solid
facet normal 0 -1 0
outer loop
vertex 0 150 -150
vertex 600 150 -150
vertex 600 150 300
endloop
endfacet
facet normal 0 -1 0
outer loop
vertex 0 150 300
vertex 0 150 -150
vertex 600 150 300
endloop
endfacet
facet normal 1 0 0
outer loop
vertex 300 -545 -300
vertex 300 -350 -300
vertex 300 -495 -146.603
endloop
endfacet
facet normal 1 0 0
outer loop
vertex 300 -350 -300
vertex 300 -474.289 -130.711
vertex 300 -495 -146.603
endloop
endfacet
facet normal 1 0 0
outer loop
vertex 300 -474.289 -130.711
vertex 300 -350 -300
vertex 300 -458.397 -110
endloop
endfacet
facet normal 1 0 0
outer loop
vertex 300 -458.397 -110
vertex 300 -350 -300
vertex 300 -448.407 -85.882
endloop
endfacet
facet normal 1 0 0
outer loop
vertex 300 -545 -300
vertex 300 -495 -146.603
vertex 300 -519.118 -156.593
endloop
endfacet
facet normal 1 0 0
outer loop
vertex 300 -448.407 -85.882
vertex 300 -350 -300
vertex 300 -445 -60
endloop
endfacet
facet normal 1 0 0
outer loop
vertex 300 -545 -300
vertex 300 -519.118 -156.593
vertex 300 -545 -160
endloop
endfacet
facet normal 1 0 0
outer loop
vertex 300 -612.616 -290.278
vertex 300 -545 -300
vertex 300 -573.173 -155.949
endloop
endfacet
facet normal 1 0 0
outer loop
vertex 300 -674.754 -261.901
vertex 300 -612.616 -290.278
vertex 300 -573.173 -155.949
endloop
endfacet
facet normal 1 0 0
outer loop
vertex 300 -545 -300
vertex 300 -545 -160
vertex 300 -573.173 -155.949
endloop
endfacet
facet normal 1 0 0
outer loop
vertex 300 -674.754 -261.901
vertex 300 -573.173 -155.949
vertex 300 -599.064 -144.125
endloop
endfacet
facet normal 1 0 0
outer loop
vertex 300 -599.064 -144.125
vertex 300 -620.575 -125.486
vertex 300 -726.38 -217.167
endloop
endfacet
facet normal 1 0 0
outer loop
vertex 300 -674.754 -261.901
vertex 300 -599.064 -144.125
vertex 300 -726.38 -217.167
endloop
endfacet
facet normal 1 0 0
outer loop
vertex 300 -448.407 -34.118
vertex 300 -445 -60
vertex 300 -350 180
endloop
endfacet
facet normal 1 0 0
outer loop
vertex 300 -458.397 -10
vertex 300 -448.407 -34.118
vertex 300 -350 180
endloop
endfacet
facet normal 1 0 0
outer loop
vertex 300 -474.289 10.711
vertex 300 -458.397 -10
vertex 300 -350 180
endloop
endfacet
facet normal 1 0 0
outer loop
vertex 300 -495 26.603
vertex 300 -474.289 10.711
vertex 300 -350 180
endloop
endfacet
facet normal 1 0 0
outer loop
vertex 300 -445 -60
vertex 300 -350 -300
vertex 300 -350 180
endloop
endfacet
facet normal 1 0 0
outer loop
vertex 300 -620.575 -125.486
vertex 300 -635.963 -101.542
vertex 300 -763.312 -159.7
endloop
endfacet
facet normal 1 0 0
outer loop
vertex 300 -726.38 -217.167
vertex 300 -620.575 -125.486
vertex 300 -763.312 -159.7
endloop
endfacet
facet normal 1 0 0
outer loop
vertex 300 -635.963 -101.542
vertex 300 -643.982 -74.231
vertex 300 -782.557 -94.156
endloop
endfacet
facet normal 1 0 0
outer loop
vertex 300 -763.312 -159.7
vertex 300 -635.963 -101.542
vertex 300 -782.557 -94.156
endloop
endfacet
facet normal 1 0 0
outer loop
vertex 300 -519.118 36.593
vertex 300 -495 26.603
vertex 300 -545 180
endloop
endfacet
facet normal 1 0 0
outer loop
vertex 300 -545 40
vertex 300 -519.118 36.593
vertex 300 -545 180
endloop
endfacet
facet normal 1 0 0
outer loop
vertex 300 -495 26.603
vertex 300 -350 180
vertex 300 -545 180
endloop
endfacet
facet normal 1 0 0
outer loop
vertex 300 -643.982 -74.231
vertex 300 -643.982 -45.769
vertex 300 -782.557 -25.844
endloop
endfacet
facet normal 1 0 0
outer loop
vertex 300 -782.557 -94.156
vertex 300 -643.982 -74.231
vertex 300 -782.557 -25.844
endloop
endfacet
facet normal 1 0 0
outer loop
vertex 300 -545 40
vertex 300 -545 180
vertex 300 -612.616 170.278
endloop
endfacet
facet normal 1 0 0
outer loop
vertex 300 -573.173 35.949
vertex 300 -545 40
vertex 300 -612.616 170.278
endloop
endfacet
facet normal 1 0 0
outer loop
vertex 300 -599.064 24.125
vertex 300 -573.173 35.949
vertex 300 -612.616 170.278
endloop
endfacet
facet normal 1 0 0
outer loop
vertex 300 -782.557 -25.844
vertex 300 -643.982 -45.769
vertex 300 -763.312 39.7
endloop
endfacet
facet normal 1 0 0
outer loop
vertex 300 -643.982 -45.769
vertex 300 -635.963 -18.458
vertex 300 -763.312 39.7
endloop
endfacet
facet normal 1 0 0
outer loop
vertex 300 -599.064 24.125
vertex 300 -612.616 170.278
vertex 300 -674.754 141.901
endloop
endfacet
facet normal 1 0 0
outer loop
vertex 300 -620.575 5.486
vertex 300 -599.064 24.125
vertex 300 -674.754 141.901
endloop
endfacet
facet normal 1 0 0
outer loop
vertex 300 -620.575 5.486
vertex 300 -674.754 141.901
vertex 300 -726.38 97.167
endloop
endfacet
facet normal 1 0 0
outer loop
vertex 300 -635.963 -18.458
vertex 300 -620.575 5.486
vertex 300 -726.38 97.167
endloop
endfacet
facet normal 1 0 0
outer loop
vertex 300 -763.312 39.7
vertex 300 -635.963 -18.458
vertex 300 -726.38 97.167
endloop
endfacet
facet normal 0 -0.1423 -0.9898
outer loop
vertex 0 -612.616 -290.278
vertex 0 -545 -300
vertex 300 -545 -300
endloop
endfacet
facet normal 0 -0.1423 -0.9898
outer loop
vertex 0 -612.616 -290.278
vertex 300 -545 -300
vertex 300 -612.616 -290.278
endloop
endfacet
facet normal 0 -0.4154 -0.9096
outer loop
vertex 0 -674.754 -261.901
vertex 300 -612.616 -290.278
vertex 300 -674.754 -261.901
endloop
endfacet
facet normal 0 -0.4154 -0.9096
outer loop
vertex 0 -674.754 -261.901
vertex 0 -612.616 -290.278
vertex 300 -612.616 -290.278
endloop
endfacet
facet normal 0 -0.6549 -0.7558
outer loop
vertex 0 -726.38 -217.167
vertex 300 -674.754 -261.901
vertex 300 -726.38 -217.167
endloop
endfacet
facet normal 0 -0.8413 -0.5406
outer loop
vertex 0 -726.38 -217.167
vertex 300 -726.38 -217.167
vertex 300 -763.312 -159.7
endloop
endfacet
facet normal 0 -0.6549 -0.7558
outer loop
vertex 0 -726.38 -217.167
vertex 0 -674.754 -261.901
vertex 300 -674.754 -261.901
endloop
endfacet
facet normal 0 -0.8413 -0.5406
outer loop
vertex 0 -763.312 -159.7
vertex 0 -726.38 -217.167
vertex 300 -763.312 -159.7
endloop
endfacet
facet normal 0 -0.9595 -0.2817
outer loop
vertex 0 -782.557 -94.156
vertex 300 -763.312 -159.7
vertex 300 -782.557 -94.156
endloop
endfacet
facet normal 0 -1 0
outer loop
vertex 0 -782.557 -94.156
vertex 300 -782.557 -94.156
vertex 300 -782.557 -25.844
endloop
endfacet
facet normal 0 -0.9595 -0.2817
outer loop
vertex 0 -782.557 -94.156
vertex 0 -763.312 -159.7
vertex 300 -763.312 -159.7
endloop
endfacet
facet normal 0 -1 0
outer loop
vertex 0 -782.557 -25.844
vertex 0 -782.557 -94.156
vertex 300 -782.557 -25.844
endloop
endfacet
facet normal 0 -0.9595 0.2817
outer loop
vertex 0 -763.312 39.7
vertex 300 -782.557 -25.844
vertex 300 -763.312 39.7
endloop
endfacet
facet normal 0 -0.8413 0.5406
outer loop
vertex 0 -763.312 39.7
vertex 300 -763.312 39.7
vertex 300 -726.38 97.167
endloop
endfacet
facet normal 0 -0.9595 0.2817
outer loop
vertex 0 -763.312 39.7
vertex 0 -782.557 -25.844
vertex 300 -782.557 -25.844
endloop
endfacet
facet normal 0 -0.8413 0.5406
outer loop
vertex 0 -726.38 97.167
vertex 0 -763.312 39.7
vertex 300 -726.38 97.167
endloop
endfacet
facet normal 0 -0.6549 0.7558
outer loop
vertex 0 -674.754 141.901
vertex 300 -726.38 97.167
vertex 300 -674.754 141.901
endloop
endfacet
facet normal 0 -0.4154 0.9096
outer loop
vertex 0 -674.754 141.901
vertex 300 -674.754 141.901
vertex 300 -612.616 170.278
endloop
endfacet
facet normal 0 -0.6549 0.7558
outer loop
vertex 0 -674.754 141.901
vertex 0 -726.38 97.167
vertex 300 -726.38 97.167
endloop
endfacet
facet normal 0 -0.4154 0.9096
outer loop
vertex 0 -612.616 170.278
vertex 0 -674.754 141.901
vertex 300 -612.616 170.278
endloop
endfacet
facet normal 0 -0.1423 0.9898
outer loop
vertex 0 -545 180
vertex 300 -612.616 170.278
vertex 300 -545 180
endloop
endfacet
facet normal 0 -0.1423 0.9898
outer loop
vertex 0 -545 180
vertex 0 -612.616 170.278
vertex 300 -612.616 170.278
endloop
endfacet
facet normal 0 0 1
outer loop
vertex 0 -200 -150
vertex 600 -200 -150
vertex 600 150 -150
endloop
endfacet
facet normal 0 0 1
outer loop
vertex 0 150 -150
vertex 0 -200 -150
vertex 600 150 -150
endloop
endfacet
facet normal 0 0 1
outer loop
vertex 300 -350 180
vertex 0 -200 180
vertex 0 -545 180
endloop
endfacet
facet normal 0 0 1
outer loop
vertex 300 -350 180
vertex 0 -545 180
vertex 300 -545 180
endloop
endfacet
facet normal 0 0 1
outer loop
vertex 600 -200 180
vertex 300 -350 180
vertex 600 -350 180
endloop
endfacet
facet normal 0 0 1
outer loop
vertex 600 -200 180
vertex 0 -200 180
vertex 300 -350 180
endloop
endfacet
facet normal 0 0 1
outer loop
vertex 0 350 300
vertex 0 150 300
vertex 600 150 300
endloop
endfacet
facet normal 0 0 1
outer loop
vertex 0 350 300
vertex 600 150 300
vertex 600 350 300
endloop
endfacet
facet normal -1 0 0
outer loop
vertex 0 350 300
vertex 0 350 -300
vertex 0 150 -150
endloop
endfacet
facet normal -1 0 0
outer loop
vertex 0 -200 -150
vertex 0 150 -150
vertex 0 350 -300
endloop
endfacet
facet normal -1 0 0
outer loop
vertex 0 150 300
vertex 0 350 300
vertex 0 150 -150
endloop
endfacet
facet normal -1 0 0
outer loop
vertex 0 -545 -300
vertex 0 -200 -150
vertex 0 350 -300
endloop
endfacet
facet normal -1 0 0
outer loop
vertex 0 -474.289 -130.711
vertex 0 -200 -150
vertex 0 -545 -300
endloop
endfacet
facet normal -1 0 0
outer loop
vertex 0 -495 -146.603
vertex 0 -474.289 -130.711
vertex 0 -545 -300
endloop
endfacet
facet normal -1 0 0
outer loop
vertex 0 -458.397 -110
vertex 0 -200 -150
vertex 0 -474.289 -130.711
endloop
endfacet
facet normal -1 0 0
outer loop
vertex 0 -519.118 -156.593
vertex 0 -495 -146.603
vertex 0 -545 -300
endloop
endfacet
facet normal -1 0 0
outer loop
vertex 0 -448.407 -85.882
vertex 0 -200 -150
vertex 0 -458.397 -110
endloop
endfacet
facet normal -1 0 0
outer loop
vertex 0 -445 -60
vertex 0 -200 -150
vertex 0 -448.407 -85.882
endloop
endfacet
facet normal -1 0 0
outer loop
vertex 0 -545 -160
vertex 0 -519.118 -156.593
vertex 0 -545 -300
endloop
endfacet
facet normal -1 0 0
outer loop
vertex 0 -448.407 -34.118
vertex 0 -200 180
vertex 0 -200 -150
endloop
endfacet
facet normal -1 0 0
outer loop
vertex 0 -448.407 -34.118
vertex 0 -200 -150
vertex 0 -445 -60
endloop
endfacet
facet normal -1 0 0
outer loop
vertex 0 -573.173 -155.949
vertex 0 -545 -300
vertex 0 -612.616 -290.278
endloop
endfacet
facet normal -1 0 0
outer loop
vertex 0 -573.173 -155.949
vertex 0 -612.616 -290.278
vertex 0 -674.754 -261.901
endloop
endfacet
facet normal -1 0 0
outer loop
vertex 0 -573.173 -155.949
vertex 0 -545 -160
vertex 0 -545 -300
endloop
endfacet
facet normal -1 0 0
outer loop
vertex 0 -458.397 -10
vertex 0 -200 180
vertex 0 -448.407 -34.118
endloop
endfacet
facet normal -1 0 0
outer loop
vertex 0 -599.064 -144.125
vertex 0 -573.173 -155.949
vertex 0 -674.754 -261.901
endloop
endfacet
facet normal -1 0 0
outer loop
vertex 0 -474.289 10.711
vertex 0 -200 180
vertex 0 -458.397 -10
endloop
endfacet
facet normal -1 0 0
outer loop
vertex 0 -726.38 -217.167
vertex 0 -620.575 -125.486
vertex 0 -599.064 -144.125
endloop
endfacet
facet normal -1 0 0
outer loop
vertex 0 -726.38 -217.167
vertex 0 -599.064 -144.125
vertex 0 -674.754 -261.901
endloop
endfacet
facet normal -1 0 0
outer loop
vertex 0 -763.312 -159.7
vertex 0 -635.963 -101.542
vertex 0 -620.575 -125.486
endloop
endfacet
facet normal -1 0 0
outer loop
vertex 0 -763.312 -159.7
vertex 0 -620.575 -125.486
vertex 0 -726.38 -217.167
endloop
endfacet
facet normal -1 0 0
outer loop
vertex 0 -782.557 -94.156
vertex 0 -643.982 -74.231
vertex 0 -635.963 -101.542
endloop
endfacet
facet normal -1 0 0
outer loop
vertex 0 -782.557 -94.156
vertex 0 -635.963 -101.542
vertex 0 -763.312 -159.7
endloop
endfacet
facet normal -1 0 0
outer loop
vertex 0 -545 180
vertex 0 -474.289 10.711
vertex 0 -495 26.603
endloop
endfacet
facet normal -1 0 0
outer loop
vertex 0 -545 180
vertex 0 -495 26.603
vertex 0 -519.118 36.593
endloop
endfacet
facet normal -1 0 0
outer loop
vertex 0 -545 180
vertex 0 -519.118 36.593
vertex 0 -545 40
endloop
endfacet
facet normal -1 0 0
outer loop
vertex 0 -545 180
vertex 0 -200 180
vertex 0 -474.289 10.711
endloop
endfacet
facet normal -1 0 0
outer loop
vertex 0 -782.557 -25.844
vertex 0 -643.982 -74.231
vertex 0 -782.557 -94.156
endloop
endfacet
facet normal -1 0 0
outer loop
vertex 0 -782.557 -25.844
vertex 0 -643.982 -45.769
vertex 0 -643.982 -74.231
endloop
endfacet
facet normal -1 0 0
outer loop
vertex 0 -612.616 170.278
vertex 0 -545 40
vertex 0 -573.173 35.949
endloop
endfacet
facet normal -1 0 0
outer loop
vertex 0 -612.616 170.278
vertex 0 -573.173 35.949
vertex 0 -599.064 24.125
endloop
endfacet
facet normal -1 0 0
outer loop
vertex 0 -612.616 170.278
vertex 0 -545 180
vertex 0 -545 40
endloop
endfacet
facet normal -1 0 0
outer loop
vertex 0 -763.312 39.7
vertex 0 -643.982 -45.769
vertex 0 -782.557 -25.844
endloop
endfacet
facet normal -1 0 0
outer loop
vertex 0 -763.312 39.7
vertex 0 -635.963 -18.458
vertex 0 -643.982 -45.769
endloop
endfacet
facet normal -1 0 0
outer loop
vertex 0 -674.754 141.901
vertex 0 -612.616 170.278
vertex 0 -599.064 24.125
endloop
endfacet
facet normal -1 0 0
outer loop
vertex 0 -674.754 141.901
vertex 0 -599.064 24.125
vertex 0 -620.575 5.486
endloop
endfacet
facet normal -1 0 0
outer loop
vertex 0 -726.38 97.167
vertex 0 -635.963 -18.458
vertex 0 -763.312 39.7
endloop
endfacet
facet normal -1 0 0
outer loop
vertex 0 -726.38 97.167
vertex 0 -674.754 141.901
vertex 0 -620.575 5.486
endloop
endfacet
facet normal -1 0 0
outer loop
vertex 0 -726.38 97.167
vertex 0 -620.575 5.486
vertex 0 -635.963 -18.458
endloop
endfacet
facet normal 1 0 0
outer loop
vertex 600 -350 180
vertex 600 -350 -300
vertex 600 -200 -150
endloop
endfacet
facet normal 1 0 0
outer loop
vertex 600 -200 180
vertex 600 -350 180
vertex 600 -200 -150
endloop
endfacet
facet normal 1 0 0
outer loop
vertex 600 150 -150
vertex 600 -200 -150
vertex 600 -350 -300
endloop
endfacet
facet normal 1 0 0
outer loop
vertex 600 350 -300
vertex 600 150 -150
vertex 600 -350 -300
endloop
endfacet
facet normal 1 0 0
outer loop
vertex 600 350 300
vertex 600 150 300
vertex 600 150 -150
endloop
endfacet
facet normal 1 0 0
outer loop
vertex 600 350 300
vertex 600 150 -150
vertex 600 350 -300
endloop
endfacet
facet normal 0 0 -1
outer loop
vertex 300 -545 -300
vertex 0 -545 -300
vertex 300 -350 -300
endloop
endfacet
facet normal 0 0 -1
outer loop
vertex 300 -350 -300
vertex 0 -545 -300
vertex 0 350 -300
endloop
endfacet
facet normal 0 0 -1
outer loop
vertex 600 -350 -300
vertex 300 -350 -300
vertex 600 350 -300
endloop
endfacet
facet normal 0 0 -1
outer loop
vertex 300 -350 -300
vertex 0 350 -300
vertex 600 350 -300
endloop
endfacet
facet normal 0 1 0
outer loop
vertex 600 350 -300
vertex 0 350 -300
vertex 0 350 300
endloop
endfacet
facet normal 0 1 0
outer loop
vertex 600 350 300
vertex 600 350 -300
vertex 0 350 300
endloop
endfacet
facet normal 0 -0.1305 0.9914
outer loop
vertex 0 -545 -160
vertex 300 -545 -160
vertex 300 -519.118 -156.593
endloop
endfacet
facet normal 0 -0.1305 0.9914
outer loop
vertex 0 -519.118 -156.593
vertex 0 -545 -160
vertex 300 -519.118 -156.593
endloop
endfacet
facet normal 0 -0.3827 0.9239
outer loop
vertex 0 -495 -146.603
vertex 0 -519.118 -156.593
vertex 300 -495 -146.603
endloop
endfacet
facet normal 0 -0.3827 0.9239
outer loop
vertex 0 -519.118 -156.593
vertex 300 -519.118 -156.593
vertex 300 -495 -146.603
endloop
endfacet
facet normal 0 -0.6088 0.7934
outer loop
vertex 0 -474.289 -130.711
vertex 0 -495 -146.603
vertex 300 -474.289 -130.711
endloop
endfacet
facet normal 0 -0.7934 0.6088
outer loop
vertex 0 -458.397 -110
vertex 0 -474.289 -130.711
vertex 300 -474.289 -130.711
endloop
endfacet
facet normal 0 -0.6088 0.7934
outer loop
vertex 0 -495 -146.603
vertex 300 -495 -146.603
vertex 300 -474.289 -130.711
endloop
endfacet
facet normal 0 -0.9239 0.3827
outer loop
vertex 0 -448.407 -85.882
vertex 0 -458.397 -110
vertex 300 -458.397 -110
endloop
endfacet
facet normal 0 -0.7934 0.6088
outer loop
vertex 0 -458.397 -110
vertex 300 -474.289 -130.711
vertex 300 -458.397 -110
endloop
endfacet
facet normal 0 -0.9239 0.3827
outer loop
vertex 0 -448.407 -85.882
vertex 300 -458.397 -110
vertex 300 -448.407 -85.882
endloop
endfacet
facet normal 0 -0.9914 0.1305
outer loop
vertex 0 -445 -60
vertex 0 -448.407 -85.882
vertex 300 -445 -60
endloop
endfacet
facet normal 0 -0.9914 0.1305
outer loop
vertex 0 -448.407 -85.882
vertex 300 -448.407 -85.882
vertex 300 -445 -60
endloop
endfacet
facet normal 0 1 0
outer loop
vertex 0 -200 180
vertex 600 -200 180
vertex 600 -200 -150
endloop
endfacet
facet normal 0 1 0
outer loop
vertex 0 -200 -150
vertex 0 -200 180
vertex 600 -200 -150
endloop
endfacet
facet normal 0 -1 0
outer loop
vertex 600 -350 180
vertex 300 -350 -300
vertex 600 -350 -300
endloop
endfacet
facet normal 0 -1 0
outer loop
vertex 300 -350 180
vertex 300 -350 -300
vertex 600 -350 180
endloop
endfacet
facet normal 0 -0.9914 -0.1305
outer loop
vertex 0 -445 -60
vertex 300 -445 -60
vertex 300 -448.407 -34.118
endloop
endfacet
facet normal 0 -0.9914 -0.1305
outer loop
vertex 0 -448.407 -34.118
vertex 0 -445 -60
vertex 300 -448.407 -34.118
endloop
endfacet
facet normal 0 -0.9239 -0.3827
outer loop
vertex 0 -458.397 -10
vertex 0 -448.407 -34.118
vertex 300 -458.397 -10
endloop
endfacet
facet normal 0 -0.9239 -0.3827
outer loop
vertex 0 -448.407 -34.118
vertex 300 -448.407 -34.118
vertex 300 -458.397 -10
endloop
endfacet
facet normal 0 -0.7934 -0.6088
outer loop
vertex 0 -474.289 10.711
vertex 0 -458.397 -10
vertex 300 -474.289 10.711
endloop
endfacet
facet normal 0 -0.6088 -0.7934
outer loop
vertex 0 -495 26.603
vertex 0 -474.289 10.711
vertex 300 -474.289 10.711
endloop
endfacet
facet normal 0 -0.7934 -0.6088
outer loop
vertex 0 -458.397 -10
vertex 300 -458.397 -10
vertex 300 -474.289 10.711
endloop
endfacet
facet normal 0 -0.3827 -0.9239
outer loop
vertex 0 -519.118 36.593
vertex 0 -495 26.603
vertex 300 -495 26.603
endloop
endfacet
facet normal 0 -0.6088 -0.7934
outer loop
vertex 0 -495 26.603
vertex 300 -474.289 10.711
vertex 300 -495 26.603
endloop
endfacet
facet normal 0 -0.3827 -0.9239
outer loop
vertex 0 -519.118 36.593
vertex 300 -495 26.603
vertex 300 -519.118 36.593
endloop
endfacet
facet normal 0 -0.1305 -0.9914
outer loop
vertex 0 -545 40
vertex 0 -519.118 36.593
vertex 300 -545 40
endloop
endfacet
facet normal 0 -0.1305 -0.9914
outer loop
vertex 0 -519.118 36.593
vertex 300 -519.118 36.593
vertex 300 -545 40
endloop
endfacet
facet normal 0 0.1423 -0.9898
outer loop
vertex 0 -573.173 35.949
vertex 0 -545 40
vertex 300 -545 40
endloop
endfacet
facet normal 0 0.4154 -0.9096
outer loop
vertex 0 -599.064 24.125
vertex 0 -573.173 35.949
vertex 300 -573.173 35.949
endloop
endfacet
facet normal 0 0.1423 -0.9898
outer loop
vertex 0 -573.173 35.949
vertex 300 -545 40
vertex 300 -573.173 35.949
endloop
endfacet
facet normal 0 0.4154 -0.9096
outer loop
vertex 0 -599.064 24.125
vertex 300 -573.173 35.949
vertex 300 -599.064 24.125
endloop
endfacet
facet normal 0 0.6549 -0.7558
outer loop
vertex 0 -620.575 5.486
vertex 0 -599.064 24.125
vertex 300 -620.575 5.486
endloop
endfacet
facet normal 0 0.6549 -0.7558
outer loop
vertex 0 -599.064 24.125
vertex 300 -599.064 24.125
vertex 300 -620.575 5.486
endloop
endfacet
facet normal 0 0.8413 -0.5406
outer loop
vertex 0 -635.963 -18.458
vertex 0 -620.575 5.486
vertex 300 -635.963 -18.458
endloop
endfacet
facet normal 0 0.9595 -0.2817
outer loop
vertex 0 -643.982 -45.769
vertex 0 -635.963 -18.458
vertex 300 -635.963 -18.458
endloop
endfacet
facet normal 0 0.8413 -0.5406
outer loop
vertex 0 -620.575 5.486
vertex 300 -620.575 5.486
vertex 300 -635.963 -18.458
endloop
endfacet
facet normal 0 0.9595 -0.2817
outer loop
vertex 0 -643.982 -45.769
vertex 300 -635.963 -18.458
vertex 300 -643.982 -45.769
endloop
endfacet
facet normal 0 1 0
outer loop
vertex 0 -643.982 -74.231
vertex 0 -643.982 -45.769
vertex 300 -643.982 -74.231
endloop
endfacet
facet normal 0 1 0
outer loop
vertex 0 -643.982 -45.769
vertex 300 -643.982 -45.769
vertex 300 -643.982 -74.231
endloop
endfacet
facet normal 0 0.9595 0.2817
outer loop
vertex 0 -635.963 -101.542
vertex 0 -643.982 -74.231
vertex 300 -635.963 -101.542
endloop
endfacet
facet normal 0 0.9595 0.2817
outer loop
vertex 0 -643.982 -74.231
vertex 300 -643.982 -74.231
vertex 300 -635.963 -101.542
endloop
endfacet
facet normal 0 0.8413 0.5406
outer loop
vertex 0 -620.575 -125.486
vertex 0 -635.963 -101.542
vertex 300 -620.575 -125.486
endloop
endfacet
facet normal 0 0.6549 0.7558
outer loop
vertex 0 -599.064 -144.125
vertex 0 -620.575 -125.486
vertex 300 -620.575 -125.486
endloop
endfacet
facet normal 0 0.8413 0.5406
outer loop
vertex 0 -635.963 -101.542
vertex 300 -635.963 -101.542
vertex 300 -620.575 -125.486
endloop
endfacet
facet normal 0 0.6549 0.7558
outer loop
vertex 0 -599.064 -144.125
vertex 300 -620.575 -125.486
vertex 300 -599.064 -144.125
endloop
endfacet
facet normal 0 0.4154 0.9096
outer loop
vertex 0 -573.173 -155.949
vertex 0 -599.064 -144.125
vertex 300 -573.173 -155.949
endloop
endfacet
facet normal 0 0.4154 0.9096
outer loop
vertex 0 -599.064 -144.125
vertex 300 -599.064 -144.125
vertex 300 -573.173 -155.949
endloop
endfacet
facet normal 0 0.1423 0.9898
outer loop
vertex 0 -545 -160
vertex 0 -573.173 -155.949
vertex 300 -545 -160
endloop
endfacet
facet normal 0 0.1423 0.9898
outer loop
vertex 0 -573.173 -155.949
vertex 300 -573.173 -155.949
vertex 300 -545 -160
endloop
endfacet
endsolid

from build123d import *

# Parameters (mm, degrees)
F0_W      = 700
F0_H      = 600
F1_DEPTH  = 600
F3_DEPTH  = 600.001
F4_W      = 150
F4_H      = 120
F5_DEPTH  = 600.001
F6_W      = 300
F6_H      = 480
F7_DEPTH  = 195
F9_DEPTH  = 300
F11_DEPTH = 300.001


with BuildPart() as f1:
    # F0 (on Right) → F1 (new body)
    with BuildSketch(Plane.YZ):
        Rectangle(F0_W, F0_H)
    extrude(amount=F1_DEPTH)

    # F2 (on face) → F3 (cut, through all)
    with BuildSketch(Plane.YZ.offset(600)):
        Polygon((150, -150), (150, 300), (-200, 300), (-200, -150), (0, -150), align=None)
    extrude(amount=-F3_DEPTH, mode=Mode.SUBTRACT)

    # F4 (on face) → F5 (cut, through all)
    with BuildSketch(Plane.YZ.offset(600)):
        with Locations((-275, 240)):
            Rectangle(F4_W, F4_H)
    extrude(amount=-F5_DEPTH, mode=Mode.SUBTRACT)

    # F6 (on face) → F7 (join)
    with BuildSketch(Plane.XZ.offset(350)):
        with Locations((150, -60)):
            Rectangle(F6_W, F6_H)
    extrude(amount=F7_DEPTH)

    # F8 (on face) → F9 (join)
    with BuildSketch(Plane(origin=(0, 0, 0), x_dir=(0, -1, 0), z_dir=(-1, 0, 0))):
        with BuildLine():
            ThreePointArc((545, -300), (714.7056274848, -229.7056274848), (785, -60))
            ThreePointArc((785, -60), (714.7056274848, 109.7056274848), (545, 180))
            Line((545, 180), (545, -300))
        make_face()
    extrude(amount=-F9_DEPTH)

    # F10 (on face) → F11 (cut, through all)
    with BuildSketch(Plane.YZ.offset(300)):
        with BuildLine():
            ThreePointArc((-445, -60), (-474.2893218813, 10.7106781187), (-545, 40))
            Line((-545, 40), (-545, -160))
            ThreePointArc((-545, -160), (-474.2893218813, -130.7106781187), (-445, -60))
        make_face()
        with BuildLine():
            Line((-545, -160), (-545, 40))
            ThreePointArc((-545, 40), (-645, -60), (-545, -160))
        make_face()
    extrude(amount=-F11_DEPTH, mode=Mode.SUBTRACT)


solid = f1.part
